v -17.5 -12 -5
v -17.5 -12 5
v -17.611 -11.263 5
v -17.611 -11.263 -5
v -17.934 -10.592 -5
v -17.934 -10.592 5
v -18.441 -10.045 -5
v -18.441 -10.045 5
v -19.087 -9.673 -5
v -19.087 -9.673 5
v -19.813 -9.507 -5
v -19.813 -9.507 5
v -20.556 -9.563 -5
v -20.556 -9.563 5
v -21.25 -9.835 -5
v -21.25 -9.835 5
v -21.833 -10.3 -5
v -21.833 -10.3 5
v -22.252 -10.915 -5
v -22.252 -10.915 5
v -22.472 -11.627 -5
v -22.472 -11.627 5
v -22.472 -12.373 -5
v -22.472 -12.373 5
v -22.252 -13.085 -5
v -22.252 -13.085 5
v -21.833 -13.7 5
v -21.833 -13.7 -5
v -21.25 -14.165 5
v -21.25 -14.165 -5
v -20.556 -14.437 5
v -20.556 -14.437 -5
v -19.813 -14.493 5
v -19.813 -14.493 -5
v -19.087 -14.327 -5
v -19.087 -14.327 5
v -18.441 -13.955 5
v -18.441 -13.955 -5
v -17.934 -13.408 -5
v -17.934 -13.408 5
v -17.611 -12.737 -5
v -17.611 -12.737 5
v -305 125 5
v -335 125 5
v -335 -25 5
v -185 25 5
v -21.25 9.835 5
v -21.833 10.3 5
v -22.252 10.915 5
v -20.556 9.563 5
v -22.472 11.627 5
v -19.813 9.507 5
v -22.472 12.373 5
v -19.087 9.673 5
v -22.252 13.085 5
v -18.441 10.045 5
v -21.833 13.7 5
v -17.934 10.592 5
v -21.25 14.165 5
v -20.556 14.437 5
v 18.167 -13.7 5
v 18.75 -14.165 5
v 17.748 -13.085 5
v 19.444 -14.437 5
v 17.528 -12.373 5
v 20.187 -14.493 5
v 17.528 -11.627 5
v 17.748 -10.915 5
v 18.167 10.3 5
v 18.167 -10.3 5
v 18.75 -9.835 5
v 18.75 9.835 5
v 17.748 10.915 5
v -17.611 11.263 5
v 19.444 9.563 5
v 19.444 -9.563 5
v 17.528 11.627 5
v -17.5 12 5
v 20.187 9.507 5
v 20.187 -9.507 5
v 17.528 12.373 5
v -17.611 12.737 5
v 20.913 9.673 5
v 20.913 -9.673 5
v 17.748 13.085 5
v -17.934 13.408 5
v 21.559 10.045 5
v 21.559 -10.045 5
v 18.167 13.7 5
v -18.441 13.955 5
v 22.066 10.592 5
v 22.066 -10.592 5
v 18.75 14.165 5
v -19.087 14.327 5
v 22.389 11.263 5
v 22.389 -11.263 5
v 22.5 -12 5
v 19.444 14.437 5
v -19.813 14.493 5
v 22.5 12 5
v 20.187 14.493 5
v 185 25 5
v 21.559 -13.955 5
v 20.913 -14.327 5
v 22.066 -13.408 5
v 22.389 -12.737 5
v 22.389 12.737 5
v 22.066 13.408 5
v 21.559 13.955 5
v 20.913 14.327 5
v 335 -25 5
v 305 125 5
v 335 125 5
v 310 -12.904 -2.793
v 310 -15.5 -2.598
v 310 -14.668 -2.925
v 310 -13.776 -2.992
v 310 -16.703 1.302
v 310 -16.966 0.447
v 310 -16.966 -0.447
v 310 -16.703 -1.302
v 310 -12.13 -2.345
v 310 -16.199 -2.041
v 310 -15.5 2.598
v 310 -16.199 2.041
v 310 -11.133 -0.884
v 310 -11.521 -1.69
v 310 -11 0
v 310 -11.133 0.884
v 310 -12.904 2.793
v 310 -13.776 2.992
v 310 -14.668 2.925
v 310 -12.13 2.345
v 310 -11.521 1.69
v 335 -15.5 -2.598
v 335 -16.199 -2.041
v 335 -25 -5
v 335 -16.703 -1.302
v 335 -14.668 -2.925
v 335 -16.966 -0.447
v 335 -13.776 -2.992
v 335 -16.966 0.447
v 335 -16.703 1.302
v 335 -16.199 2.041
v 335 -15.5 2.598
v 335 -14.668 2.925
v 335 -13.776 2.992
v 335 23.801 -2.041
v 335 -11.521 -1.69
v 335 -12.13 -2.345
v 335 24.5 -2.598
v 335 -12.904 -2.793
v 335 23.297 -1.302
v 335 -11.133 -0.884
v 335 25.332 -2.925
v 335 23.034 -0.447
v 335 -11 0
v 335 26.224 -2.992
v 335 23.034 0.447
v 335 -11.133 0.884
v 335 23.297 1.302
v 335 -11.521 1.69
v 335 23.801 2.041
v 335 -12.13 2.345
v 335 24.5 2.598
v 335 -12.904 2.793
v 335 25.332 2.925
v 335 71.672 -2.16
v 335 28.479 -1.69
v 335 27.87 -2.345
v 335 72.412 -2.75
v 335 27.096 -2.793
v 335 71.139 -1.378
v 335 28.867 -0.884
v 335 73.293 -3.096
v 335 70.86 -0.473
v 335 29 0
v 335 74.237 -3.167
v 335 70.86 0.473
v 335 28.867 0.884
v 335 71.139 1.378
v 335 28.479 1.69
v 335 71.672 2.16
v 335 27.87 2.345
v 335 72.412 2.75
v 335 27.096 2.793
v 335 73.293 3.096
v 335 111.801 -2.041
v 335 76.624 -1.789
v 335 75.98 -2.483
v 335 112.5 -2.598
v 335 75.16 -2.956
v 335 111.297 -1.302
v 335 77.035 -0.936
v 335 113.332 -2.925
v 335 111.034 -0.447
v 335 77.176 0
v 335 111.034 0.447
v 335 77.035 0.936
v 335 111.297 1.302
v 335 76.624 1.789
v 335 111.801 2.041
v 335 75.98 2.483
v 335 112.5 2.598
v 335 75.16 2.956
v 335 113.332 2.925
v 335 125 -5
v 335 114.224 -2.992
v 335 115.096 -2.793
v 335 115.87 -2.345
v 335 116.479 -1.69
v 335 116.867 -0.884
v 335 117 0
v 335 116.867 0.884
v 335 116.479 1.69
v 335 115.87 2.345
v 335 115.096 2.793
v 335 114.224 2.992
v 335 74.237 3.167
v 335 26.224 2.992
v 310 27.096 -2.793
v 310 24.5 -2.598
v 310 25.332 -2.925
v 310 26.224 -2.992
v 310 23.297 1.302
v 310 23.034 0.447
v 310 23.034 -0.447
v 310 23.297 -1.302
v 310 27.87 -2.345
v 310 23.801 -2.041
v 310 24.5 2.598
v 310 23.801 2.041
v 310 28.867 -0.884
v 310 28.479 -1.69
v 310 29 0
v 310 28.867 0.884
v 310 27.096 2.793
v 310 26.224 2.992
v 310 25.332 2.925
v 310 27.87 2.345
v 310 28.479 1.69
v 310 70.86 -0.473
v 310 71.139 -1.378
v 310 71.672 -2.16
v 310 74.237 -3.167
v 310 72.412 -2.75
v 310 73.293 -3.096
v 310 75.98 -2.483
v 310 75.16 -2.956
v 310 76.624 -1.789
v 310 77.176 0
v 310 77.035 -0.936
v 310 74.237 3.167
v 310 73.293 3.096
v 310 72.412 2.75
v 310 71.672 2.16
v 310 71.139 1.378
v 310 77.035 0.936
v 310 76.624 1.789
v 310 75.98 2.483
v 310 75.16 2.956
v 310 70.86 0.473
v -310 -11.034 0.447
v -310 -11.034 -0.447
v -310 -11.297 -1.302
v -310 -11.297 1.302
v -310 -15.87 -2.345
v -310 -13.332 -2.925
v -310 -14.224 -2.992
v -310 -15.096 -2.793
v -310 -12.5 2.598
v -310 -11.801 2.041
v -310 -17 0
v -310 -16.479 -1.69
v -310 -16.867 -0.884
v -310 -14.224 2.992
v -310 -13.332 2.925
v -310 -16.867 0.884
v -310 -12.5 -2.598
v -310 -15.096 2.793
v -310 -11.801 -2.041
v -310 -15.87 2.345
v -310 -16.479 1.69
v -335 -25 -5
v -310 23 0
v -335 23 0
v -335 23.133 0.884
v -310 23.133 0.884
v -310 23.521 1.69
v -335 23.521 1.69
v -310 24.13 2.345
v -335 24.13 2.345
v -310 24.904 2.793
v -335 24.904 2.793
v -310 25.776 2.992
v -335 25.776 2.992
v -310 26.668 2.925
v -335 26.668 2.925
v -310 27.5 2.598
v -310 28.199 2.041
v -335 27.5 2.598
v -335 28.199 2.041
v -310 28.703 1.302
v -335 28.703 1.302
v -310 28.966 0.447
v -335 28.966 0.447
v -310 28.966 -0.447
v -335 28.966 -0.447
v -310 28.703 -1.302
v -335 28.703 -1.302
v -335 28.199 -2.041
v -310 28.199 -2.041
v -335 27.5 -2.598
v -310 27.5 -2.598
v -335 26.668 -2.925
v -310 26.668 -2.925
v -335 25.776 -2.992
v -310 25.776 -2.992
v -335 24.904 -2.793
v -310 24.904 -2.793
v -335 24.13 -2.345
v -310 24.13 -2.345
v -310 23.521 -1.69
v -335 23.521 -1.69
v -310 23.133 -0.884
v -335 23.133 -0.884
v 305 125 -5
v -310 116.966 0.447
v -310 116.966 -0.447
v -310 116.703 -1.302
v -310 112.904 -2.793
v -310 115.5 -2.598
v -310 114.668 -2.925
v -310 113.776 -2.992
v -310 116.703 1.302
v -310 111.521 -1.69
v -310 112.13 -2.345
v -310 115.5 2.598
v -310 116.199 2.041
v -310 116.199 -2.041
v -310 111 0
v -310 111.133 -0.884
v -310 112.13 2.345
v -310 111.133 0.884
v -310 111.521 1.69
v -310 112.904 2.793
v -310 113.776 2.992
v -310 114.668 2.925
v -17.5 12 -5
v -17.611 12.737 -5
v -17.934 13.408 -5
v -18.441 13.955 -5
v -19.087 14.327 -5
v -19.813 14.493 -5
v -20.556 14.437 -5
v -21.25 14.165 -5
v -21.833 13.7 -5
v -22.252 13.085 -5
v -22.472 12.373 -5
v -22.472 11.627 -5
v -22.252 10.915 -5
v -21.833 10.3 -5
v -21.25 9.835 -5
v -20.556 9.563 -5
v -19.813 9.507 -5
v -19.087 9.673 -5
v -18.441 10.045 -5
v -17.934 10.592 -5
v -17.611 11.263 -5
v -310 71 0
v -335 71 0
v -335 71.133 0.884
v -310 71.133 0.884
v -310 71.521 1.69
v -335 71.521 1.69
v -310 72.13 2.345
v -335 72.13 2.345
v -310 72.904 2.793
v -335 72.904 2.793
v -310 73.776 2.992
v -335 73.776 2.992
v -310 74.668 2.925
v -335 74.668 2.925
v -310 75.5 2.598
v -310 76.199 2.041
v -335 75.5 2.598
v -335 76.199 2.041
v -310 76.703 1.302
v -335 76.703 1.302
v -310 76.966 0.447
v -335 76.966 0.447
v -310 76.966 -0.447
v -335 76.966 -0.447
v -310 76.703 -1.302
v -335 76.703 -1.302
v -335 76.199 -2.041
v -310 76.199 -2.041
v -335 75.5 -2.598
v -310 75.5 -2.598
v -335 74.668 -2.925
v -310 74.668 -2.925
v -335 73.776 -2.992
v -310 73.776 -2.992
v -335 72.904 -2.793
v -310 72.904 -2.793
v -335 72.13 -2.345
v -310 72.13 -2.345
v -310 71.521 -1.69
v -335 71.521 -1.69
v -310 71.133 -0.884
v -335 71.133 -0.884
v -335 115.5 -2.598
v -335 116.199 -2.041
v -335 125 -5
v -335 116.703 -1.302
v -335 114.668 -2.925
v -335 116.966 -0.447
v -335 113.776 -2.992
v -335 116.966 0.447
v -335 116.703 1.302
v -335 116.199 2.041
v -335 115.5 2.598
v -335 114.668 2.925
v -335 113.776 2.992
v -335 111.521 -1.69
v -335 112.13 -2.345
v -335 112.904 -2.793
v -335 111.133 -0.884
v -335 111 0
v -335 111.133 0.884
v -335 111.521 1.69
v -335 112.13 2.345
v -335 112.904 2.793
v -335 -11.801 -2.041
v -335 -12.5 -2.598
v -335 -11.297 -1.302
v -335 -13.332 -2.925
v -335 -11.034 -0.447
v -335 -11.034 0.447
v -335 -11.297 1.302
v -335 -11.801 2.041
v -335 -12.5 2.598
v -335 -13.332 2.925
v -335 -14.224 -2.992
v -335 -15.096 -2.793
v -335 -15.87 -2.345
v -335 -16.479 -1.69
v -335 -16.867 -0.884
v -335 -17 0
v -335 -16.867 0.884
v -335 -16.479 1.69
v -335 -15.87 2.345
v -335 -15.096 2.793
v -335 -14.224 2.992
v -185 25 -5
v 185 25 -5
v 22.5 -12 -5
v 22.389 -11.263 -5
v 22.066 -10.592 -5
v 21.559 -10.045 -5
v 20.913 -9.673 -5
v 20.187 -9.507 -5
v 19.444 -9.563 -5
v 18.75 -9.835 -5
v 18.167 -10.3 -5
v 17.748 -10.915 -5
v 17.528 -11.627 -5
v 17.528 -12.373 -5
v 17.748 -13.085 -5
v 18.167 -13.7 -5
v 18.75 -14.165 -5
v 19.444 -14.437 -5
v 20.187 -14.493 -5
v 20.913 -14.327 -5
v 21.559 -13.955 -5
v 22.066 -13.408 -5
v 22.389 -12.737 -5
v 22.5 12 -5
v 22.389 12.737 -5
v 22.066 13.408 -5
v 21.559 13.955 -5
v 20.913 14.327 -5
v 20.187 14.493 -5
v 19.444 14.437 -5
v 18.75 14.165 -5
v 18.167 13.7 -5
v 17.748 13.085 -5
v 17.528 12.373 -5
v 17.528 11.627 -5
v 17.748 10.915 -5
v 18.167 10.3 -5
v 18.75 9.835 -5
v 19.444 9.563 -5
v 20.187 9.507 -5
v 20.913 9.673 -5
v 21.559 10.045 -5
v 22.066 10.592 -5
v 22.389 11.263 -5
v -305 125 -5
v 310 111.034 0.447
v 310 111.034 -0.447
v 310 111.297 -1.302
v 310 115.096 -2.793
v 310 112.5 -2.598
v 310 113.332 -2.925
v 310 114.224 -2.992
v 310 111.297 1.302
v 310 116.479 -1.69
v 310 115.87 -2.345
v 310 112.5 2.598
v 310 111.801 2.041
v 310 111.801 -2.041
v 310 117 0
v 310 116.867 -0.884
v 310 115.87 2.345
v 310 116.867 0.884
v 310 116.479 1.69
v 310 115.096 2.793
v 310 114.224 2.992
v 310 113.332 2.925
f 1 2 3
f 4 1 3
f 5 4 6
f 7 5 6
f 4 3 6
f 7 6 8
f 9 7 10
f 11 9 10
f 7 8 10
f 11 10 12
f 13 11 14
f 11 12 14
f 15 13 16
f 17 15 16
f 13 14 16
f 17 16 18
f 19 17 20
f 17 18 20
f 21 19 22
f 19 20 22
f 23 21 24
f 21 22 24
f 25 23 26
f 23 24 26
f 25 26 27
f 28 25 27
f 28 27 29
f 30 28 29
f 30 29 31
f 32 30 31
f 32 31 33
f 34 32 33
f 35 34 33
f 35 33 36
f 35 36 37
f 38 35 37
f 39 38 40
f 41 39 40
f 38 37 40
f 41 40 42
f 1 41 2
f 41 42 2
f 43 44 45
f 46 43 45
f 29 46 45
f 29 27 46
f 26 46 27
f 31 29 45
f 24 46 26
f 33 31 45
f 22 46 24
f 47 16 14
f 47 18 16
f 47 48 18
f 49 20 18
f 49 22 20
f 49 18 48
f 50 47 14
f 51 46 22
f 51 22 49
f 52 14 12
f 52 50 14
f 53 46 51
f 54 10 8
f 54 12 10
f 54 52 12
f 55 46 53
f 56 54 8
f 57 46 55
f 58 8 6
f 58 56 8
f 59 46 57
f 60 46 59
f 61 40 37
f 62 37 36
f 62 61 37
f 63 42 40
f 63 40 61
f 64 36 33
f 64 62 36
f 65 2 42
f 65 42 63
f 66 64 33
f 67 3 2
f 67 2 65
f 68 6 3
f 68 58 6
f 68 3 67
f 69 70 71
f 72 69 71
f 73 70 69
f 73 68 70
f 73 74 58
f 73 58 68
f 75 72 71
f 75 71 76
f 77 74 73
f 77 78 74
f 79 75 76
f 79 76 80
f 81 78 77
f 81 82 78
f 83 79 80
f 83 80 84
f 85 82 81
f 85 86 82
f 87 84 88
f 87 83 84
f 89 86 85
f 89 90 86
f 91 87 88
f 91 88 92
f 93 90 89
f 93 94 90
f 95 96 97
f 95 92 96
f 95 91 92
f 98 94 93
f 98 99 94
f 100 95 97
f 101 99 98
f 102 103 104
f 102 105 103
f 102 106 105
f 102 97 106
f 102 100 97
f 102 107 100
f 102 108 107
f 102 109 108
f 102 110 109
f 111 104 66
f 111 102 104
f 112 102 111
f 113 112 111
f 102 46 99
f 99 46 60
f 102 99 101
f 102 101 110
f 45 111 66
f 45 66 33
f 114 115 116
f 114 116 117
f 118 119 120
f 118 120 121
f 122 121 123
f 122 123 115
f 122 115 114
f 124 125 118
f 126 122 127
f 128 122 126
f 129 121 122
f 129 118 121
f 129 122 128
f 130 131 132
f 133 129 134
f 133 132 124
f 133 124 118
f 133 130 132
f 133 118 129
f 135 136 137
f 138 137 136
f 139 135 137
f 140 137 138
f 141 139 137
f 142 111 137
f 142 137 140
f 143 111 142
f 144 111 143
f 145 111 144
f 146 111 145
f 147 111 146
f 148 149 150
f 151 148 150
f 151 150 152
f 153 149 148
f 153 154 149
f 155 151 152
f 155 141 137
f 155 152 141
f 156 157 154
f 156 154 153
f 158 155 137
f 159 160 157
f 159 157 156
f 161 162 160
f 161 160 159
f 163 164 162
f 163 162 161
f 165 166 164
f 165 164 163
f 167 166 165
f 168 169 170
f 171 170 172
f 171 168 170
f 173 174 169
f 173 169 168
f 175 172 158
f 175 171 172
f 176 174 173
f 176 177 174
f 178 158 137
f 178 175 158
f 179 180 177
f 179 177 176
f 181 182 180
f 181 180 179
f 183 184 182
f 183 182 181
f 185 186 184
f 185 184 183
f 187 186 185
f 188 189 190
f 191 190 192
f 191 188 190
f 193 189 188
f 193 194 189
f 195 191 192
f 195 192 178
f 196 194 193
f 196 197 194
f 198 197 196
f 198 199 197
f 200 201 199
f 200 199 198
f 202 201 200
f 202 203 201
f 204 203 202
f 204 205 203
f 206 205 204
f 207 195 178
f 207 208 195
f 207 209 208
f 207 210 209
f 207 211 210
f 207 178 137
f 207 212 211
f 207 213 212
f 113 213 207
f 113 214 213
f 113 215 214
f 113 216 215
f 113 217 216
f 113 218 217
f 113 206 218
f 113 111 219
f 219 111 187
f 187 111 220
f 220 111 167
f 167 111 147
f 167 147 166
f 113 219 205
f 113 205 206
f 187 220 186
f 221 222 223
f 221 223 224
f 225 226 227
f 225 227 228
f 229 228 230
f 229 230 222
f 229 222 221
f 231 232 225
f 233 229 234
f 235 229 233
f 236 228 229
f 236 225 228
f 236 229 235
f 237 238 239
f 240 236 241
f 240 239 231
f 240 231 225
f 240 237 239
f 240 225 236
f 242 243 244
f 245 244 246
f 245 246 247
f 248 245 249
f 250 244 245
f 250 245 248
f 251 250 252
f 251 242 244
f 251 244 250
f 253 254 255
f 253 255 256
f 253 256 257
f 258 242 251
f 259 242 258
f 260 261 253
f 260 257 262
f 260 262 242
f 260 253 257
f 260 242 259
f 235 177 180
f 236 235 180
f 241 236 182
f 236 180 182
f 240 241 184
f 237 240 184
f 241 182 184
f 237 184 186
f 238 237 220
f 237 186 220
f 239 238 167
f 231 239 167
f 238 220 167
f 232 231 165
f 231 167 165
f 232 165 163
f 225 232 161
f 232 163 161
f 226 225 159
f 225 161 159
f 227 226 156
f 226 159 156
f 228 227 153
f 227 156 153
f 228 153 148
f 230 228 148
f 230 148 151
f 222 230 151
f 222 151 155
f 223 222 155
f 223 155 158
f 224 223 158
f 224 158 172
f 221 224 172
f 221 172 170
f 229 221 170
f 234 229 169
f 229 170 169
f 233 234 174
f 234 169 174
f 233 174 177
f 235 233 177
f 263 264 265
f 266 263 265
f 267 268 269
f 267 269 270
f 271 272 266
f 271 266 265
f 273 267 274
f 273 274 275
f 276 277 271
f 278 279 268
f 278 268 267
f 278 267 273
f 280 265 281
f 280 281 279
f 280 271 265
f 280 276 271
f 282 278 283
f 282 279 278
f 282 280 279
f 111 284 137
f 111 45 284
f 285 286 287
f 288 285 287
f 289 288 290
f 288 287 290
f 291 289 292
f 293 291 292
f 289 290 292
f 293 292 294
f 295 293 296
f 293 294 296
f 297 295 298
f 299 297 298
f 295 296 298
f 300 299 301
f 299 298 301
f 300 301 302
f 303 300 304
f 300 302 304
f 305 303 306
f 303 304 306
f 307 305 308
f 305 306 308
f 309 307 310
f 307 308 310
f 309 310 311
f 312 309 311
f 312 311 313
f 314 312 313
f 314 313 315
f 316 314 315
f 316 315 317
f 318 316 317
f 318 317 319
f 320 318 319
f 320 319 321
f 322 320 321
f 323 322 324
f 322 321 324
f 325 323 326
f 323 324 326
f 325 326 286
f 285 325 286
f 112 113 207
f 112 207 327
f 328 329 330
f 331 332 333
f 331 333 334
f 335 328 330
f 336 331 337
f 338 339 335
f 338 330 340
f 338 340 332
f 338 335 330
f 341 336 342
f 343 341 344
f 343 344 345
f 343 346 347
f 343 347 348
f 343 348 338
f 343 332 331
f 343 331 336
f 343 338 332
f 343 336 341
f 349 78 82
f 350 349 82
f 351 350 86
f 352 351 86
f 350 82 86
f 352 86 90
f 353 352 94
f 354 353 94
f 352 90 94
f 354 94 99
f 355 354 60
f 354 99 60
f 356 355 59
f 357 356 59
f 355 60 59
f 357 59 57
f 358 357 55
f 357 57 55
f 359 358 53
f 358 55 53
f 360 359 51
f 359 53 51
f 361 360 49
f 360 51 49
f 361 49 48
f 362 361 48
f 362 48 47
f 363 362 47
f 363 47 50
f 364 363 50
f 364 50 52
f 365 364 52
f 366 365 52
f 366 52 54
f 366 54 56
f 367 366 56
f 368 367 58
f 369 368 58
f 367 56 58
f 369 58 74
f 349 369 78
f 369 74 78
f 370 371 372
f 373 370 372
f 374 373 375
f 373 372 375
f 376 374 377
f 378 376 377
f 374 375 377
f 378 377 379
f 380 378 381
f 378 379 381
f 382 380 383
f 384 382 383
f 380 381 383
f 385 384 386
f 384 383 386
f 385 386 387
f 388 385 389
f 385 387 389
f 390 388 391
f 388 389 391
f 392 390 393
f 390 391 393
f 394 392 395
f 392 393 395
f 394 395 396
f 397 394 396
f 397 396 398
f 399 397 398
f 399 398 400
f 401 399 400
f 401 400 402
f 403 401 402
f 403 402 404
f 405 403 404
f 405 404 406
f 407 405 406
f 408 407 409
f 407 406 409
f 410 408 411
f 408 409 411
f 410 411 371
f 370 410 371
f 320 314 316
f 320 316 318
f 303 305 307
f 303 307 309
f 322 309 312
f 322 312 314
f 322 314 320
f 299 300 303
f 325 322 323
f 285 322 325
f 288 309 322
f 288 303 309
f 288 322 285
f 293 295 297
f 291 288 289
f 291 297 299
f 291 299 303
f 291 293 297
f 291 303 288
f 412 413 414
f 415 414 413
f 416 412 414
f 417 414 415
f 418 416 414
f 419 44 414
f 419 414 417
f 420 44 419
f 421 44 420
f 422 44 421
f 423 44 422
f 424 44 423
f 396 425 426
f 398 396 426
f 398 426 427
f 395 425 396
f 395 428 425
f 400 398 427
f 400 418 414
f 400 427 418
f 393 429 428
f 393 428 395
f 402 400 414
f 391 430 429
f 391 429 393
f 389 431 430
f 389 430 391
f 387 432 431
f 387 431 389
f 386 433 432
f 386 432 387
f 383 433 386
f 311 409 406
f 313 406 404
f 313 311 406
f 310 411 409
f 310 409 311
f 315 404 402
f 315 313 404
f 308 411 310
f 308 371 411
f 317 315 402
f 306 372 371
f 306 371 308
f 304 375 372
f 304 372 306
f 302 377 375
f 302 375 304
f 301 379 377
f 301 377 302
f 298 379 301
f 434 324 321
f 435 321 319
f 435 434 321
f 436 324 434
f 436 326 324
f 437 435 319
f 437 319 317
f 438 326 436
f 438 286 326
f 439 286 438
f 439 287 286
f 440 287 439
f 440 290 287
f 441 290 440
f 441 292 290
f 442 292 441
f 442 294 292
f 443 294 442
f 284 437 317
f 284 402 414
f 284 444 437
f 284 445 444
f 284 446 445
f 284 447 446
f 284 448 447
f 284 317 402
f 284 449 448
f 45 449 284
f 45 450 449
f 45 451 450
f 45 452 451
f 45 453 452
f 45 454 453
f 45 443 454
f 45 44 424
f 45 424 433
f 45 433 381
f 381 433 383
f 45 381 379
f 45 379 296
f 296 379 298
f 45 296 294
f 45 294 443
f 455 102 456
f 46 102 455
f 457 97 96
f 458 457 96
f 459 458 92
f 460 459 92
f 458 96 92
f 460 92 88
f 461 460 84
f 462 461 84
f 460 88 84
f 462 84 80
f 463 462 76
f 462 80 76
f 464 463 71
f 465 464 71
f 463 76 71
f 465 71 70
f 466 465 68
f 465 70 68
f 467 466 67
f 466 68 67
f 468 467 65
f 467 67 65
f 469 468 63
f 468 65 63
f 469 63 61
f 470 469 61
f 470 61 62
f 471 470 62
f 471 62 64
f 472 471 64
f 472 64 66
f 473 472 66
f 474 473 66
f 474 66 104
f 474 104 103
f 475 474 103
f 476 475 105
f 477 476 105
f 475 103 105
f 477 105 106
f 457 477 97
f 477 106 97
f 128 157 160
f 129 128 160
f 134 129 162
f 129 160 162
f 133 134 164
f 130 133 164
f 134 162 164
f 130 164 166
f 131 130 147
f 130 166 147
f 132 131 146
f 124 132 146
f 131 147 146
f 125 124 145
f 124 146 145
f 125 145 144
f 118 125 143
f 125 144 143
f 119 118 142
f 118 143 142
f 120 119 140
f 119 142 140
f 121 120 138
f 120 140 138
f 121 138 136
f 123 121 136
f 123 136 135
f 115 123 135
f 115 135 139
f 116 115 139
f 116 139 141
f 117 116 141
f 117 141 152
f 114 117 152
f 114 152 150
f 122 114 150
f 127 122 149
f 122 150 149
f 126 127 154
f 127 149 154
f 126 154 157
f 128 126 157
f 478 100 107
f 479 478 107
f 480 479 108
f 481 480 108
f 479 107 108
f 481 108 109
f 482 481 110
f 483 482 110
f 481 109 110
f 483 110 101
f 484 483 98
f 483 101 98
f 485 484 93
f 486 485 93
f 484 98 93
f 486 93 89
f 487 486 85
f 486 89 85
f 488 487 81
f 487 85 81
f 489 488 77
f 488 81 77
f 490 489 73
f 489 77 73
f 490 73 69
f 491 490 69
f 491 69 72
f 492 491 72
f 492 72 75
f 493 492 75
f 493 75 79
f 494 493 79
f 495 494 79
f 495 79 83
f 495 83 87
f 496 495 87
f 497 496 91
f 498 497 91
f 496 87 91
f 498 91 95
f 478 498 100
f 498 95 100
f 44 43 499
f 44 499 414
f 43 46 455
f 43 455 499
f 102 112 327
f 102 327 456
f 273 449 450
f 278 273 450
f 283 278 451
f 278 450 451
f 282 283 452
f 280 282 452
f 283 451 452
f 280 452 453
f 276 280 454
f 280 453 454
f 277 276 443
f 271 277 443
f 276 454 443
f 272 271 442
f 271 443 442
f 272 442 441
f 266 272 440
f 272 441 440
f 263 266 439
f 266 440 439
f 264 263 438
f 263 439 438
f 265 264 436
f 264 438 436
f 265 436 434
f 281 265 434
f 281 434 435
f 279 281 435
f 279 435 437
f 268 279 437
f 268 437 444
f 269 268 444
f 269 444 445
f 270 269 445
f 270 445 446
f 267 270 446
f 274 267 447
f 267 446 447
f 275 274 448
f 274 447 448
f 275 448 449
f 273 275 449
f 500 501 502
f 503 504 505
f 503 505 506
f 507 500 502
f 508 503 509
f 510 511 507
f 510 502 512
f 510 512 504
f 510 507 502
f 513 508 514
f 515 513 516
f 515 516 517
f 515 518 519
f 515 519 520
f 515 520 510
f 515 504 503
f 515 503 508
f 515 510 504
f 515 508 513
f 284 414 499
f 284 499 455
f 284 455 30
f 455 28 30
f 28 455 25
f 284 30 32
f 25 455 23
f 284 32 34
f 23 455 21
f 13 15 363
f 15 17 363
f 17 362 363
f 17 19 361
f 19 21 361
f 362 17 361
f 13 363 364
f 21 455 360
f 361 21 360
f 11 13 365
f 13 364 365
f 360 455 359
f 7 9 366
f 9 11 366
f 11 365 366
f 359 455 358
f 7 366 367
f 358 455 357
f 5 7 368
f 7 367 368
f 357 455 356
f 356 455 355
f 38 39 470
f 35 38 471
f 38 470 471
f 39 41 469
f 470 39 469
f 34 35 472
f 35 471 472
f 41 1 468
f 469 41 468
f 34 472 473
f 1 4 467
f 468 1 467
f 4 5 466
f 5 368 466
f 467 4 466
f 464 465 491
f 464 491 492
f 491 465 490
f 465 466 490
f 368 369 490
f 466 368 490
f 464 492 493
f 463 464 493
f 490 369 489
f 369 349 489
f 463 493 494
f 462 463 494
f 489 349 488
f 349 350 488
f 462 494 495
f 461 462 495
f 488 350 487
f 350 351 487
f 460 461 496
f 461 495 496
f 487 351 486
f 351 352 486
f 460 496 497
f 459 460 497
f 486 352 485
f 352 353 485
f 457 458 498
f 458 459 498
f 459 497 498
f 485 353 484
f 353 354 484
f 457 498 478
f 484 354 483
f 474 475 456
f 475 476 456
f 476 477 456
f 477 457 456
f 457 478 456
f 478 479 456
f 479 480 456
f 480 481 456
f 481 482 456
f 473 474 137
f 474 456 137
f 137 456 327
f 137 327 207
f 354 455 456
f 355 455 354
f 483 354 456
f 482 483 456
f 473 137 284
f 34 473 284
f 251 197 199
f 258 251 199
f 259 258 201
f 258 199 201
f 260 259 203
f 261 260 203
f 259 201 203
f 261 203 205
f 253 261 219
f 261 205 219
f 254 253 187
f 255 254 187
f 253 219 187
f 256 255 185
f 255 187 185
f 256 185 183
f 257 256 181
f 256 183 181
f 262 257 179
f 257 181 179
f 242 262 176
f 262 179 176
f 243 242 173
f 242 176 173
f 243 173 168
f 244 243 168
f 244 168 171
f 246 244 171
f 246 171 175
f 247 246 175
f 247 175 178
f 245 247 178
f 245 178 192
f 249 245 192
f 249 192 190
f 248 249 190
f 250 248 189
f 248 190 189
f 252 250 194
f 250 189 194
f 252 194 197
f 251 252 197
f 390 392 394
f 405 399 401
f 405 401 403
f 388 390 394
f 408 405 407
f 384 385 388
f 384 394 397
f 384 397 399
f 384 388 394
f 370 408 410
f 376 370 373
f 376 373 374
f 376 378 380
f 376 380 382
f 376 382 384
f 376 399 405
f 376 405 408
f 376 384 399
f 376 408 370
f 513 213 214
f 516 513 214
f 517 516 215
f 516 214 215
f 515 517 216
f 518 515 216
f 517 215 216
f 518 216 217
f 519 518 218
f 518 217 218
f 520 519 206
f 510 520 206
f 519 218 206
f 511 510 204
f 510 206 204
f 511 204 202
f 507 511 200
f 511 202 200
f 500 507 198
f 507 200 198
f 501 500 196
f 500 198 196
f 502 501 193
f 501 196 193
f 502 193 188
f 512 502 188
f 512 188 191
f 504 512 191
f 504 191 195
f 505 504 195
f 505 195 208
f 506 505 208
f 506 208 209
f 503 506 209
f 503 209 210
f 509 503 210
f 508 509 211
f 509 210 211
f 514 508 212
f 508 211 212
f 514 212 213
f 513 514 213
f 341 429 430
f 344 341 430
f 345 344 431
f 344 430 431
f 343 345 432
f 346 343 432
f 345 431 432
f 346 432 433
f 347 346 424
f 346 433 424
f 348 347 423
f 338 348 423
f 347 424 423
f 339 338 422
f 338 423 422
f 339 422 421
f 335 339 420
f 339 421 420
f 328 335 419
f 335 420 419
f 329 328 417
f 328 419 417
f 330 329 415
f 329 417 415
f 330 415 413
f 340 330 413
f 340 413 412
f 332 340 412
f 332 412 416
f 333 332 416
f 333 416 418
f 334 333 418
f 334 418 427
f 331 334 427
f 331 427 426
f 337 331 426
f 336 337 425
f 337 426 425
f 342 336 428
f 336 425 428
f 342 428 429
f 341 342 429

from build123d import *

# Parameters (mm, degrees)
F1_DEPTH = 5
F2_R     = 3
F2_R_2   = 3.175833
F3_DEPTH = 25
F4_R     = 3
F5_DEPTH = 25
F6_R     = 2.5
F7_DEPTH = 10


with BuildPart() as f1:
    # F0 (on Top) → F1 (new body, symmetric)
    with BuildSketch(Plane.XY):
        Polygon((335, -25), (335, 25), (185, 25), (-185, 25), (-335, 25), (-335, -25), align=None)
        Polygon((185, 25), (335, 25), (335, 125), (305, 125), align=None)
        Polygon((-335, 25), (-185, 25), (-305, 125), (-335, 125), align=None)
    extrude(amount=F1_DEPTH, both=True)

    # F2 (on face) → F3 (cut)
    with BuildSketch(Plane.YZ.offset(335)):
        with Locations((26, 0)):
            Circle(F2_R)
        with Locations((-14, 0)):
            Circle(F2_R)
        with Locations((74, 0)):
            Circle(F2_R_2)
        with Locations((114, 0)):
            Circle(F2_R)
    extrude(amount=-F3_DEPTH, mode=Mode.SUBTRACT)

    # F4 (on face) → F5 (cut)
    with BuildSketch(Plane(origin=(-335, 0, 0), x_dir=(0, -1, 0), z_dir=(-1, 0, 0))):
        with Locations((14, 0)):
            Circle(F4_R)
        with Locations((-26, 0)):
            Circle(F4_R)
        with Locations((-74, 0)):
            Circle(F4_R)
        with Locations((-114, 0)):
            Circle(F4_R)
    extrude(amount=-F5_DEPTH, mode=Mode.SUBTRACT)

    # F6 (on face) → F7 (cut)
    with BuildSketch(Plane.XY.offset(5)):
        with Locations((-20, 12)):
            Circle(F6_R)
        with Locations((20, 12)):
            Circle(F6_R)
        with Locations((20, -12)):
            Circle(F6_R)
        with Locations((-20, -12)):
            Circle(F6_R)
    extrude(amount=-F7_DEPTH, mode=Mode.SUBTRACT)


solid = f1.part
